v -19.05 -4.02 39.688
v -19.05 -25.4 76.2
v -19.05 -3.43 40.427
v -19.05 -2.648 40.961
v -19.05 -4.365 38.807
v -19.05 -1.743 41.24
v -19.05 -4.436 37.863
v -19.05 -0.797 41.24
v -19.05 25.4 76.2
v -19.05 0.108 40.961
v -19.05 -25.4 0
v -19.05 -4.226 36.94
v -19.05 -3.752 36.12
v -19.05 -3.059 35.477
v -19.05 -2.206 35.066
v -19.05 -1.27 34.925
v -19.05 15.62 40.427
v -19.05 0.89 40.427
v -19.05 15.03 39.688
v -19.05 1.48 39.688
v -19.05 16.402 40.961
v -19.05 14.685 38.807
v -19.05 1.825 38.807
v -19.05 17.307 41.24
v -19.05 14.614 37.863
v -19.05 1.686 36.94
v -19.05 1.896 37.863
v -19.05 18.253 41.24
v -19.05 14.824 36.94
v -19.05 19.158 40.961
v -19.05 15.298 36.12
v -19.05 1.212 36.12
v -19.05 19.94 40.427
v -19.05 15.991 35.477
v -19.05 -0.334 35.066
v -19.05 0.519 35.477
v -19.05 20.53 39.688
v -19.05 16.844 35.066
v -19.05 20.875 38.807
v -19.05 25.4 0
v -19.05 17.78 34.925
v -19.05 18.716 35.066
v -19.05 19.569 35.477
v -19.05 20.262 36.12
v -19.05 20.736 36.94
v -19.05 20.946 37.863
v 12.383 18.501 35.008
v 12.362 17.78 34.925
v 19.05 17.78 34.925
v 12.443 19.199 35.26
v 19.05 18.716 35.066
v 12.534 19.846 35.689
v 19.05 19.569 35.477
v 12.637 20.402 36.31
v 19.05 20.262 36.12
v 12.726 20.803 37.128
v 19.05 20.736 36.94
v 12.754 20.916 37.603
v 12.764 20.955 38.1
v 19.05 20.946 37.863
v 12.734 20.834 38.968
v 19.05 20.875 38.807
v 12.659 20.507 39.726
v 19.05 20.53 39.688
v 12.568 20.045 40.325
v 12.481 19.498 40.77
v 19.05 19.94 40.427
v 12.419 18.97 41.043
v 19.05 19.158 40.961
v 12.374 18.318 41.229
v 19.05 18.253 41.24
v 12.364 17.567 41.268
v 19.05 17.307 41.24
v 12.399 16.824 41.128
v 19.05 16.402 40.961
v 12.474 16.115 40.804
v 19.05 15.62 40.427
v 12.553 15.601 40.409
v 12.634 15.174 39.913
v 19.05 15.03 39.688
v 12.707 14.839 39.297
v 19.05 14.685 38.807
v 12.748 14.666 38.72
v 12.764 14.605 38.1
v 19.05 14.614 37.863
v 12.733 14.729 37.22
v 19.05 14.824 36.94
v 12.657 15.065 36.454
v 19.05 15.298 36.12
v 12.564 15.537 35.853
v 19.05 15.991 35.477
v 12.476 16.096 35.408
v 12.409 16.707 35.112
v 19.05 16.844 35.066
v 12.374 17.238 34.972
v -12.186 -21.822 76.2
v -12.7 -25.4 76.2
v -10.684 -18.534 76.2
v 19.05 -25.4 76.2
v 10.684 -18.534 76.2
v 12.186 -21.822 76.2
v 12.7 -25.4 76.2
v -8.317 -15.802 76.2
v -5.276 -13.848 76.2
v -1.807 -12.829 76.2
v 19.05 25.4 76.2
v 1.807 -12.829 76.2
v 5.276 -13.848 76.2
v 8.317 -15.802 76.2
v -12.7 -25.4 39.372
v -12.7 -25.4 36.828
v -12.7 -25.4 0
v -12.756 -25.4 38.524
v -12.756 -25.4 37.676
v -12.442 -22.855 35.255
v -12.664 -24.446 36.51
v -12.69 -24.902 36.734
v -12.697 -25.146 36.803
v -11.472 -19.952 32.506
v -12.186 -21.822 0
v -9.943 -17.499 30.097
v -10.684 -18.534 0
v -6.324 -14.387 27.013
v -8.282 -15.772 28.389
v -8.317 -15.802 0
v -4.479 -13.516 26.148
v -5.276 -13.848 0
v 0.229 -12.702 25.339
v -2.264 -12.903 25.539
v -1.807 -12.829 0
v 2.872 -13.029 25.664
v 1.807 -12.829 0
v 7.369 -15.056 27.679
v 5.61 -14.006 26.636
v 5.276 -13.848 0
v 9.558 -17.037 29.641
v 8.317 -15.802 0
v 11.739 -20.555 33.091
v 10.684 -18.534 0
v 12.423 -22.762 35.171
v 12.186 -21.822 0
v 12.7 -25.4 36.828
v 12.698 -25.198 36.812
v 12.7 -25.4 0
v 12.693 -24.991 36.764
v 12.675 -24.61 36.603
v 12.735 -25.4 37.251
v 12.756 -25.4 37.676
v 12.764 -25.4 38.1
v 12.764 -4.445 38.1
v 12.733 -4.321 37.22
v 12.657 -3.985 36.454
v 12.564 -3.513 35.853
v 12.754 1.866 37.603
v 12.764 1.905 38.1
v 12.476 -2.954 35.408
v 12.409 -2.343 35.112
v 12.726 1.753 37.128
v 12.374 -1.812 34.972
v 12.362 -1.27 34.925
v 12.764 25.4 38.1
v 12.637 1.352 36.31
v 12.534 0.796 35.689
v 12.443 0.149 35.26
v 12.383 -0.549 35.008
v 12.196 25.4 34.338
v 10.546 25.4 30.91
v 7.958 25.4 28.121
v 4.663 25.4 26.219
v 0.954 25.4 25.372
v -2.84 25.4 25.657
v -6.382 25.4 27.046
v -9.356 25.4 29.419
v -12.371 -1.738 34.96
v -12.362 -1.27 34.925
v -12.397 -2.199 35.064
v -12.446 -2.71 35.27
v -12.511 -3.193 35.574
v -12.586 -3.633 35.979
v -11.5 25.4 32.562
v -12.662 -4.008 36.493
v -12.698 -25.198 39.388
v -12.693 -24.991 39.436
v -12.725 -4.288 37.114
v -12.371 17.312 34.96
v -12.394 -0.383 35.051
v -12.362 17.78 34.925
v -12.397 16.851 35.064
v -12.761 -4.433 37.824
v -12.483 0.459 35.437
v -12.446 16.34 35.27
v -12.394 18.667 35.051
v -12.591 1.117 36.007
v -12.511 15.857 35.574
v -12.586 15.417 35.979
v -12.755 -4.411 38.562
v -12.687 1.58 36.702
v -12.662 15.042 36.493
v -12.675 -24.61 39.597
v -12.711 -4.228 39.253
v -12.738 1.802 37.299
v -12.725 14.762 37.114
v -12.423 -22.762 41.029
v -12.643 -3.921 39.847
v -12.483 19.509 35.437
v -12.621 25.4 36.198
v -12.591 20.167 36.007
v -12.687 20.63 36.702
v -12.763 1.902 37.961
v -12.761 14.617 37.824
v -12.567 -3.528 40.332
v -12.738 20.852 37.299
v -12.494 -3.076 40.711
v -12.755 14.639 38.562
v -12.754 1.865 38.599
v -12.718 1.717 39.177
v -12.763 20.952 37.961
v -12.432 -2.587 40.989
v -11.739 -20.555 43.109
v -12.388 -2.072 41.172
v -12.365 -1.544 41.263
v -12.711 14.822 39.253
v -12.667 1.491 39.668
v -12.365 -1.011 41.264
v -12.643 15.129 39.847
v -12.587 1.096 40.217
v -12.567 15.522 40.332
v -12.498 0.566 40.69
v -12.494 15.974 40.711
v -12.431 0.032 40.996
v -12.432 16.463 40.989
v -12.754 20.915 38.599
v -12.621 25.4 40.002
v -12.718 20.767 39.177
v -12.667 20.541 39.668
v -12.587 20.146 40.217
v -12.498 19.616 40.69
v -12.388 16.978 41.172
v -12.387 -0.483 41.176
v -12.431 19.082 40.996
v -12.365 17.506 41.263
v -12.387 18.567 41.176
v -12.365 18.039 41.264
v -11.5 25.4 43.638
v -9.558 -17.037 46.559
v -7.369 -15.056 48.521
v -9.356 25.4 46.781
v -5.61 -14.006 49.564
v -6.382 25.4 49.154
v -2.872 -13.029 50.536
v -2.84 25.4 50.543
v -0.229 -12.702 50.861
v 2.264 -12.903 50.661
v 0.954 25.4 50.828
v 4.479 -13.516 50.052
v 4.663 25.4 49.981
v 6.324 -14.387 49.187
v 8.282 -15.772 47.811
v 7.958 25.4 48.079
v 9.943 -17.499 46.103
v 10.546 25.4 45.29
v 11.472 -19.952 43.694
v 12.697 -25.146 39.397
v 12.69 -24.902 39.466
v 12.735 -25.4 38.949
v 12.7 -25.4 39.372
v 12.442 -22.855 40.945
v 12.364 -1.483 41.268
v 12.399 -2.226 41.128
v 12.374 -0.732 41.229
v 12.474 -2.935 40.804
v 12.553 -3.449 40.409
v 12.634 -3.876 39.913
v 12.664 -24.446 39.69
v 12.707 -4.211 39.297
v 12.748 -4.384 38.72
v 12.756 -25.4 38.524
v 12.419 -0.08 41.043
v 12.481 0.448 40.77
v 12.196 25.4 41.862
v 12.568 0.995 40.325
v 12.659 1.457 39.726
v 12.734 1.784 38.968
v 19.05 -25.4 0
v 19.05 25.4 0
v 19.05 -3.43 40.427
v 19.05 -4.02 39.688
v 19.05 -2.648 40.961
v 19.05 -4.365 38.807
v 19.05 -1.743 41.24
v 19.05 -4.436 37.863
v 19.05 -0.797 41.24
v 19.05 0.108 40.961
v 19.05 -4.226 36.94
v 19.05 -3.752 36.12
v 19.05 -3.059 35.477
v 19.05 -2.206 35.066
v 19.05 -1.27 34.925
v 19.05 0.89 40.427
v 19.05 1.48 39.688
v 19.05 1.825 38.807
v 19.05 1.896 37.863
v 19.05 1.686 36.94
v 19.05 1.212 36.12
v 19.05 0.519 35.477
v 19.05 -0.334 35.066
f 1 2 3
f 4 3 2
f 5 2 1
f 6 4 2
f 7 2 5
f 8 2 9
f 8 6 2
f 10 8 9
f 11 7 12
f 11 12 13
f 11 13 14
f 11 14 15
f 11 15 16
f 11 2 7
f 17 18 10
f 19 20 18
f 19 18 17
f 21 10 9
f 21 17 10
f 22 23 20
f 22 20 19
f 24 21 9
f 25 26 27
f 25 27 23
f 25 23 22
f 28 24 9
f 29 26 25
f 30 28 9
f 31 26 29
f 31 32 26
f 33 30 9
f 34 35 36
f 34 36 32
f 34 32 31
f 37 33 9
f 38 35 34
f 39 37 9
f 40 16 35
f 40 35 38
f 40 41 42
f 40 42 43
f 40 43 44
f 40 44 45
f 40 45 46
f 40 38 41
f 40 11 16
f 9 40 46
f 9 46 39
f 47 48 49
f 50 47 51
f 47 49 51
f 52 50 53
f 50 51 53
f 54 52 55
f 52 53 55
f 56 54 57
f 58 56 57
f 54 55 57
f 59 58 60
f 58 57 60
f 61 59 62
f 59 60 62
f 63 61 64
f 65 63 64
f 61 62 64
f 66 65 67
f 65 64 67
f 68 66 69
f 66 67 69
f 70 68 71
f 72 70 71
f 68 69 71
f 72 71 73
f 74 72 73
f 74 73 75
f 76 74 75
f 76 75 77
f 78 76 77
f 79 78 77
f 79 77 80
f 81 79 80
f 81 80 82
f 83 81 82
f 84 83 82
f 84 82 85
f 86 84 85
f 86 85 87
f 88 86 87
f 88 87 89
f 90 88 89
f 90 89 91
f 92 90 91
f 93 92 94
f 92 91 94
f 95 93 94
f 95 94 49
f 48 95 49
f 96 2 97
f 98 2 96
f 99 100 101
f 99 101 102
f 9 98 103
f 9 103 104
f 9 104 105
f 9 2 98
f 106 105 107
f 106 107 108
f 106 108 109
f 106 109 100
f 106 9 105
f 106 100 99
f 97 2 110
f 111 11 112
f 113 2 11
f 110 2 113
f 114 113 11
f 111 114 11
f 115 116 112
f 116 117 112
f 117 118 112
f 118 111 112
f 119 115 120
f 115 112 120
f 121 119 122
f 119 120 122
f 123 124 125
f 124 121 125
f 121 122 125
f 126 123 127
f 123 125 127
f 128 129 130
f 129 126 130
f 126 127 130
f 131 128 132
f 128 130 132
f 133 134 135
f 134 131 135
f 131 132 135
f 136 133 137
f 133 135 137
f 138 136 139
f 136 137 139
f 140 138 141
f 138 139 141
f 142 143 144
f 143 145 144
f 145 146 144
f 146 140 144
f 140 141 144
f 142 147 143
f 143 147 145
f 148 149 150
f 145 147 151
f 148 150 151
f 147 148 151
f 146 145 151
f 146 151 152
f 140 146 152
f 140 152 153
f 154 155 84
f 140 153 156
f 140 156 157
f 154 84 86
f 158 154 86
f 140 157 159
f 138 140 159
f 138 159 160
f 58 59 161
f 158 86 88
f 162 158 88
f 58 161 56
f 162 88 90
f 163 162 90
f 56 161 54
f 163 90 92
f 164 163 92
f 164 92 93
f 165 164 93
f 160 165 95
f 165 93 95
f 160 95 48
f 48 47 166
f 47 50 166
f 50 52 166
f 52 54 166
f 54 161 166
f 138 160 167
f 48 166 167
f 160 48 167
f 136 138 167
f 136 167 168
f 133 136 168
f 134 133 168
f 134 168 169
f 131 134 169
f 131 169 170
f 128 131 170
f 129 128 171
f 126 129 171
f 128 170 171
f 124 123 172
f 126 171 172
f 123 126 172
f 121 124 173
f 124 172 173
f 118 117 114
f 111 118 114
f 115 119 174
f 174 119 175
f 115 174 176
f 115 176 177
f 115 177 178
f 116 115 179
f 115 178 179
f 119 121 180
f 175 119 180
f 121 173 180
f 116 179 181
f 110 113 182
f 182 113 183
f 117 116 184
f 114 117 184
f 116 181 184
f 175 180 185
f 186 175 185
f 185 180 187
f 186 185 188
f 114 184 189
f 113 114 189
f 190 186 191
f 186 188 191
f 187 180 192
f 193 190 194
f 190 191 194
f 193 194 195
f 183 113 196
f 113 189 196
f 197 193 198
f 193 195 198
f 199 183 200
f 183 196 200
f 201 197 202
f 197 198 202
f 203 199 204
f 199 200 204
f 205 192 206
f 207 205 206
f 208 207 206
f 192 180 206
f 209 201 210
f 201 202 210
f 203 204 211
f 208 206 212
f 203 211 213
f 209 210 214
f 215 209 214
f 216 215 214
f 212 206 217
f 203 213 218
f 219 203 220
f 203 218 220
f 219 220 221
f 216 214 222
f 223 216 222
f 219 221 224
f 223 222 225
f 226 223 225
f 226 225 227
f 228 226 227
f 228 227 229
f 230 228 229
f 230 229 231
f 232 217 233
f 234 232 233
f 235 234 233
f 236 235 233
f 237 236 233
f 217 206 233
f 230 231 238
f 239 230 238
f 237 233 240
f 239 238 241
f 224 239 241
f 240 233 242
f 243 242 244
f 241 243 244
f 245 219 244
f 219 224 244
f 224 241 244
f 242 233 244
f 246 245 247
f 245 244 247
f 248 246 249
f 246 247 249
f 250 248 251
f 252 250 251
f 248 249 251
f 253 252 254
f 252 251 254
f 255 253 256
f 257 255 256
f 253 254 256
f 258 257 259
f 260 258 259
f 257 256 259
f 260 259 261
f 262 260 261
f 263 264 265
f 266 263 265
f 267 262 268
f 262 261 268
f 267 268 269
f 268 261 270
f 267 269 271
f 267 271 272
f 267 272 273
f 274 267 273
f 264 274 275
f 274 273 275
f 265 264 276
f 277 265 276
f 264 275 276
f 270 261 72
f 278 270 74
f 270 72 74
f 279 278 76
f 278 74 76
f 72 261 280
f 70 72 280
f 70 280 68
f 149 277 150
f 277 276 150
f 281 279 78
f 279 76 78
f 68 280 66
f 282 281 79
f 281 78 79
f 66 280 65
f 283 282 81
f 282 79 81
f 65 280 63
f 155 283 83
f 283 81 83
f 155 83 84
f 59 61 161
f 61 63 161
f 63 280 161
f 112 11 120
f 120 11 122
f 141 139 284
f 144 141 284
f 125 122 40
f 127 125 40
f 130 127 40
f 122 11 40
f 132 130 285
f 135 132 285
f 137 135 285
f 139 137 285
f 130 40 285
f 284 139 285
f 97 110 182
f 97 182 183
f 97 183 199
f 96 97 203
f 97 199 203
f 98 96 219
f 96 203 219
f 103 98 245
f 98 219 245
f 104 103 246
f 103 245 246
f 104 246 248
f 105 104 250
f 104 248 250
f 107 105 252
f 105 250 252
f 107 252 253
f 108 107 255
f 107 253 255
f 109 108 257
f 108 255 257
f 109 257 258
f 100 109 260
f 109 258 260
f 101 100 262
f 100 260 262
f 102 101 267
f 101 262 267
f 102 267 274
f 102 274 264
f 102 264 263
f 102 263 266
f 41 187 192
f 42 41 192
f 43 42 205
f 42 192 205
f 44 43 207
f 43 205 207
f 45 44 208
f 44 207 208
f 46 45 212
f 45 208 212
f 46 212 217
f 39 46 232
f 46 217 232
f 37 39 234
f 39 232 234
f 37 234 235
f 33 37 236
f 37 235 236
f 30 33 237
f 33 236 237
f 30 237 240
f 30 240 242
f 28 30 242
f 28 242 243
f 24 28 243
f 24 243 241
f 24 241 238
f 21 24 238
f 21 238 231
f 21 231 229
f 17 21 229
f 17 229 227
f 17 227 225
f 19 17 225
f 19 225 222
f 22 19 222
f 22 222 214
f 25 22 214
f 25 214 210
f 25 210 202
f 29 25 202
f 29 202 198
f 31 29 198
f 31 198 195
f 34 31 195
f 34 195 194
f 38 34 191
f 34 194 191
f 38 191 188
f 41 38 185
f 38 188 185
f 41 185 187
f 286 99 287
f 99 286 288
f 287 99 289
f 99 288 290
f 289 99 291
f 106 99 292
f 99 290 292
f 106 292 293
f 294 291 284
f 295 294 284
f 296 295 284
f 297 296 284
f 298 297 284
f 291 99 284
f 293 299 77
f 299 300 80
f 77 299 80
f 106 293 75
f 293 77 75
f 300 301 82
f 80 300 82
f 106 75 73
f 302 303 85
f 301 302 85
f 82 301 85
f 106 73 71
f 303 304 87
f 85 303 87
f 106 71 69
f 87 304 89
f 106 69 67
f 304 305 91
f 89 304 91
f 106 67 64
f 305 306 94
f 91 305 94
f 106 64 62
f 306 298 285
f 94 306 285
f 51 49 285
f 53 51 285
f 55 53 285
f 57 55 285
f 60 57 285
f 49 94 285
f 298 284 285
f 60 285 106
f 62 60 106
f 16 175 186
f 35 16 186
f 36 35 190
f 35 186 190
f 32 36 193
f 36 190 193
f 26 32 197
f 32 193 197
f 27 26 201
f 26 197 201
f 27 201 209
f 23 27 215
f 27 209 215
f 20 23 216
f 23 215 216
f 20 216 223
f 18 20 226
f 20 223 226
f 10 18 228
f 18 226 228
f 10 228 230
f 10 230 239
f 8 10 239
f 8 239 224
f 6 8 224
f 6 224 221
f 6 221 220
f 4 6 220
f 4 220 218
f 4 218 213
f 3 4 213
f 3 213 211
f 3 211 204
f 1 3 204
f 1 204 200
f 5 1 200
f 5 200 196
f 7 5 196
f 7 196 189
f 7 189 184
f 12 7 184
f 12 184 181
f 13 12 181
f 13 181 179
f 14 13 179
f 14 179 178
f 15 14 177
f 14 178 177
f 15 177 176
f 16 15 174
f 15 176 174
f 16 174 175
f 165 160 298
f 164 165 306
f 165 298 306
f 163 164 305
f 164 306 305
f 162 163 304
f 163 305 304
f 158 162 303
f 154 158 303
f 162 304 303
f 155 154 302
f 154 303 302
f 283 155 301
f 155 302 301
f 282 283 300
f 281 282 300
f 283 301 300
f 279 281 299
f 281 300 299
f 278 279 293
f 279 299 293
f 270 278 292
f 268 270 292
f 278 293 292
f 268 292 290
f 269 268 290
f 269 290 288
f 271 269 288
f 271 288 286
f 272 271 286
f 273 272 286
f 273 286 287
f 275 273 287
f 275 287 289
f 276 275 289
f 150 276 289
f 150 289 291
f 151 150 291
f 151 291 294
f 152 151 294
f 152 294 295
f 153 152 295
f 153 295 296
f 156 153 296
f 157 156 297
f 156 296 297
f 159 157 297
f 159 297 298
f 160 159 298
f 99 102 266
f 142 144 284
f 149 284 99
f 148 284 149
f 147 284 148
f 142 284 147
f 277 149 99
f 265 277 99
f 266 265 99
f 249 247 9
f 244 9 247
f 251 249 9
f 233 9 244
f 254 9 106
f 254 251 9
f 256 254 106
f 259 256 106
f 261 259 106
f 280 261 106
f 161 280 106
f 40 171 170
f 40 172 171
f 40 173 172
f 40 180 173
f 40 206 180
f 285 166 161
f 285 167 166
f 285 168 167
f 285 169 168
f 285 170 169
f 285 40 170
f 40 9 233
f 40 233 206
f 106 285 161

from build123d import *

# Parameters (mm, degrees)
SKETCH1_W           = 38.1
SKETCH1_H           = 50.8
BOSS_EXTRUDE1_DEPTH = 76.2
SKETCH5_R           = 12.7
CUT_EXTRUDE3_DEPTH  = 77.2
SKETCH6_R           = 12.7635
CUT_EXTRUDE4_DEPTH  = 50.8
SKETCH7_R           = 3.175
CUT_EXTRUDE5_DEPTH  = 39.1


with BuildPart() as part:
    # Sketch1 → Boss-Extrude1 (new body)
    with BuildSketch(Plane.XY):
        Rectangle(SKETCH1_W, SKETCH1_H)
    extrude(amount=BOSS_EXTRUDE1_DEPTH)

    # Sketch5 → Cut-Extrude3 (cut, through all)
    with BuildSketch(Plane(origin=(0, 0, 0), x_dir=(-1, 0, 0), z_dir=(0, 0, -1))):
        with Locations((0, -25.4)):
            Circle(SKETCH5_R)
    extrude(amount=-CUT_EXTRUDE3_DEPTH, mode=Mode.SUBTRACT)

    # Sketch6 → Cut-Extrude4 (cut)
    with BuildSketch(Plane(origin=(0, 25.4, 0), x_dir=(1, 0, 0), z_dir=(0, 1, 0))):
        with Locations((0, -38.1)):
            Circle(SKETCH6_R)
    extrude(amount=-CUT_EXTRUDE4_DEPTH, mode=Mode.SUBTRACT)

    # Sketch7 → Cut-Extrude5 (cut, through all)
    with BuildSketch(Plane(origin=(19.05, 0, 0), x_dir=(0, 0, -1), z_dir=(1, 0, 0))):
        with Locations((-38.1, 17.78)):
            Circle(SKETCH7_R)
        with Locations((-38.1, -1.27)):
            Circle(SKETCH7_R)
    extrude(amount=-CUT_EXTRUDE5_DEPTH, mode=Mode.SUBTRACT)


solid = part.part
